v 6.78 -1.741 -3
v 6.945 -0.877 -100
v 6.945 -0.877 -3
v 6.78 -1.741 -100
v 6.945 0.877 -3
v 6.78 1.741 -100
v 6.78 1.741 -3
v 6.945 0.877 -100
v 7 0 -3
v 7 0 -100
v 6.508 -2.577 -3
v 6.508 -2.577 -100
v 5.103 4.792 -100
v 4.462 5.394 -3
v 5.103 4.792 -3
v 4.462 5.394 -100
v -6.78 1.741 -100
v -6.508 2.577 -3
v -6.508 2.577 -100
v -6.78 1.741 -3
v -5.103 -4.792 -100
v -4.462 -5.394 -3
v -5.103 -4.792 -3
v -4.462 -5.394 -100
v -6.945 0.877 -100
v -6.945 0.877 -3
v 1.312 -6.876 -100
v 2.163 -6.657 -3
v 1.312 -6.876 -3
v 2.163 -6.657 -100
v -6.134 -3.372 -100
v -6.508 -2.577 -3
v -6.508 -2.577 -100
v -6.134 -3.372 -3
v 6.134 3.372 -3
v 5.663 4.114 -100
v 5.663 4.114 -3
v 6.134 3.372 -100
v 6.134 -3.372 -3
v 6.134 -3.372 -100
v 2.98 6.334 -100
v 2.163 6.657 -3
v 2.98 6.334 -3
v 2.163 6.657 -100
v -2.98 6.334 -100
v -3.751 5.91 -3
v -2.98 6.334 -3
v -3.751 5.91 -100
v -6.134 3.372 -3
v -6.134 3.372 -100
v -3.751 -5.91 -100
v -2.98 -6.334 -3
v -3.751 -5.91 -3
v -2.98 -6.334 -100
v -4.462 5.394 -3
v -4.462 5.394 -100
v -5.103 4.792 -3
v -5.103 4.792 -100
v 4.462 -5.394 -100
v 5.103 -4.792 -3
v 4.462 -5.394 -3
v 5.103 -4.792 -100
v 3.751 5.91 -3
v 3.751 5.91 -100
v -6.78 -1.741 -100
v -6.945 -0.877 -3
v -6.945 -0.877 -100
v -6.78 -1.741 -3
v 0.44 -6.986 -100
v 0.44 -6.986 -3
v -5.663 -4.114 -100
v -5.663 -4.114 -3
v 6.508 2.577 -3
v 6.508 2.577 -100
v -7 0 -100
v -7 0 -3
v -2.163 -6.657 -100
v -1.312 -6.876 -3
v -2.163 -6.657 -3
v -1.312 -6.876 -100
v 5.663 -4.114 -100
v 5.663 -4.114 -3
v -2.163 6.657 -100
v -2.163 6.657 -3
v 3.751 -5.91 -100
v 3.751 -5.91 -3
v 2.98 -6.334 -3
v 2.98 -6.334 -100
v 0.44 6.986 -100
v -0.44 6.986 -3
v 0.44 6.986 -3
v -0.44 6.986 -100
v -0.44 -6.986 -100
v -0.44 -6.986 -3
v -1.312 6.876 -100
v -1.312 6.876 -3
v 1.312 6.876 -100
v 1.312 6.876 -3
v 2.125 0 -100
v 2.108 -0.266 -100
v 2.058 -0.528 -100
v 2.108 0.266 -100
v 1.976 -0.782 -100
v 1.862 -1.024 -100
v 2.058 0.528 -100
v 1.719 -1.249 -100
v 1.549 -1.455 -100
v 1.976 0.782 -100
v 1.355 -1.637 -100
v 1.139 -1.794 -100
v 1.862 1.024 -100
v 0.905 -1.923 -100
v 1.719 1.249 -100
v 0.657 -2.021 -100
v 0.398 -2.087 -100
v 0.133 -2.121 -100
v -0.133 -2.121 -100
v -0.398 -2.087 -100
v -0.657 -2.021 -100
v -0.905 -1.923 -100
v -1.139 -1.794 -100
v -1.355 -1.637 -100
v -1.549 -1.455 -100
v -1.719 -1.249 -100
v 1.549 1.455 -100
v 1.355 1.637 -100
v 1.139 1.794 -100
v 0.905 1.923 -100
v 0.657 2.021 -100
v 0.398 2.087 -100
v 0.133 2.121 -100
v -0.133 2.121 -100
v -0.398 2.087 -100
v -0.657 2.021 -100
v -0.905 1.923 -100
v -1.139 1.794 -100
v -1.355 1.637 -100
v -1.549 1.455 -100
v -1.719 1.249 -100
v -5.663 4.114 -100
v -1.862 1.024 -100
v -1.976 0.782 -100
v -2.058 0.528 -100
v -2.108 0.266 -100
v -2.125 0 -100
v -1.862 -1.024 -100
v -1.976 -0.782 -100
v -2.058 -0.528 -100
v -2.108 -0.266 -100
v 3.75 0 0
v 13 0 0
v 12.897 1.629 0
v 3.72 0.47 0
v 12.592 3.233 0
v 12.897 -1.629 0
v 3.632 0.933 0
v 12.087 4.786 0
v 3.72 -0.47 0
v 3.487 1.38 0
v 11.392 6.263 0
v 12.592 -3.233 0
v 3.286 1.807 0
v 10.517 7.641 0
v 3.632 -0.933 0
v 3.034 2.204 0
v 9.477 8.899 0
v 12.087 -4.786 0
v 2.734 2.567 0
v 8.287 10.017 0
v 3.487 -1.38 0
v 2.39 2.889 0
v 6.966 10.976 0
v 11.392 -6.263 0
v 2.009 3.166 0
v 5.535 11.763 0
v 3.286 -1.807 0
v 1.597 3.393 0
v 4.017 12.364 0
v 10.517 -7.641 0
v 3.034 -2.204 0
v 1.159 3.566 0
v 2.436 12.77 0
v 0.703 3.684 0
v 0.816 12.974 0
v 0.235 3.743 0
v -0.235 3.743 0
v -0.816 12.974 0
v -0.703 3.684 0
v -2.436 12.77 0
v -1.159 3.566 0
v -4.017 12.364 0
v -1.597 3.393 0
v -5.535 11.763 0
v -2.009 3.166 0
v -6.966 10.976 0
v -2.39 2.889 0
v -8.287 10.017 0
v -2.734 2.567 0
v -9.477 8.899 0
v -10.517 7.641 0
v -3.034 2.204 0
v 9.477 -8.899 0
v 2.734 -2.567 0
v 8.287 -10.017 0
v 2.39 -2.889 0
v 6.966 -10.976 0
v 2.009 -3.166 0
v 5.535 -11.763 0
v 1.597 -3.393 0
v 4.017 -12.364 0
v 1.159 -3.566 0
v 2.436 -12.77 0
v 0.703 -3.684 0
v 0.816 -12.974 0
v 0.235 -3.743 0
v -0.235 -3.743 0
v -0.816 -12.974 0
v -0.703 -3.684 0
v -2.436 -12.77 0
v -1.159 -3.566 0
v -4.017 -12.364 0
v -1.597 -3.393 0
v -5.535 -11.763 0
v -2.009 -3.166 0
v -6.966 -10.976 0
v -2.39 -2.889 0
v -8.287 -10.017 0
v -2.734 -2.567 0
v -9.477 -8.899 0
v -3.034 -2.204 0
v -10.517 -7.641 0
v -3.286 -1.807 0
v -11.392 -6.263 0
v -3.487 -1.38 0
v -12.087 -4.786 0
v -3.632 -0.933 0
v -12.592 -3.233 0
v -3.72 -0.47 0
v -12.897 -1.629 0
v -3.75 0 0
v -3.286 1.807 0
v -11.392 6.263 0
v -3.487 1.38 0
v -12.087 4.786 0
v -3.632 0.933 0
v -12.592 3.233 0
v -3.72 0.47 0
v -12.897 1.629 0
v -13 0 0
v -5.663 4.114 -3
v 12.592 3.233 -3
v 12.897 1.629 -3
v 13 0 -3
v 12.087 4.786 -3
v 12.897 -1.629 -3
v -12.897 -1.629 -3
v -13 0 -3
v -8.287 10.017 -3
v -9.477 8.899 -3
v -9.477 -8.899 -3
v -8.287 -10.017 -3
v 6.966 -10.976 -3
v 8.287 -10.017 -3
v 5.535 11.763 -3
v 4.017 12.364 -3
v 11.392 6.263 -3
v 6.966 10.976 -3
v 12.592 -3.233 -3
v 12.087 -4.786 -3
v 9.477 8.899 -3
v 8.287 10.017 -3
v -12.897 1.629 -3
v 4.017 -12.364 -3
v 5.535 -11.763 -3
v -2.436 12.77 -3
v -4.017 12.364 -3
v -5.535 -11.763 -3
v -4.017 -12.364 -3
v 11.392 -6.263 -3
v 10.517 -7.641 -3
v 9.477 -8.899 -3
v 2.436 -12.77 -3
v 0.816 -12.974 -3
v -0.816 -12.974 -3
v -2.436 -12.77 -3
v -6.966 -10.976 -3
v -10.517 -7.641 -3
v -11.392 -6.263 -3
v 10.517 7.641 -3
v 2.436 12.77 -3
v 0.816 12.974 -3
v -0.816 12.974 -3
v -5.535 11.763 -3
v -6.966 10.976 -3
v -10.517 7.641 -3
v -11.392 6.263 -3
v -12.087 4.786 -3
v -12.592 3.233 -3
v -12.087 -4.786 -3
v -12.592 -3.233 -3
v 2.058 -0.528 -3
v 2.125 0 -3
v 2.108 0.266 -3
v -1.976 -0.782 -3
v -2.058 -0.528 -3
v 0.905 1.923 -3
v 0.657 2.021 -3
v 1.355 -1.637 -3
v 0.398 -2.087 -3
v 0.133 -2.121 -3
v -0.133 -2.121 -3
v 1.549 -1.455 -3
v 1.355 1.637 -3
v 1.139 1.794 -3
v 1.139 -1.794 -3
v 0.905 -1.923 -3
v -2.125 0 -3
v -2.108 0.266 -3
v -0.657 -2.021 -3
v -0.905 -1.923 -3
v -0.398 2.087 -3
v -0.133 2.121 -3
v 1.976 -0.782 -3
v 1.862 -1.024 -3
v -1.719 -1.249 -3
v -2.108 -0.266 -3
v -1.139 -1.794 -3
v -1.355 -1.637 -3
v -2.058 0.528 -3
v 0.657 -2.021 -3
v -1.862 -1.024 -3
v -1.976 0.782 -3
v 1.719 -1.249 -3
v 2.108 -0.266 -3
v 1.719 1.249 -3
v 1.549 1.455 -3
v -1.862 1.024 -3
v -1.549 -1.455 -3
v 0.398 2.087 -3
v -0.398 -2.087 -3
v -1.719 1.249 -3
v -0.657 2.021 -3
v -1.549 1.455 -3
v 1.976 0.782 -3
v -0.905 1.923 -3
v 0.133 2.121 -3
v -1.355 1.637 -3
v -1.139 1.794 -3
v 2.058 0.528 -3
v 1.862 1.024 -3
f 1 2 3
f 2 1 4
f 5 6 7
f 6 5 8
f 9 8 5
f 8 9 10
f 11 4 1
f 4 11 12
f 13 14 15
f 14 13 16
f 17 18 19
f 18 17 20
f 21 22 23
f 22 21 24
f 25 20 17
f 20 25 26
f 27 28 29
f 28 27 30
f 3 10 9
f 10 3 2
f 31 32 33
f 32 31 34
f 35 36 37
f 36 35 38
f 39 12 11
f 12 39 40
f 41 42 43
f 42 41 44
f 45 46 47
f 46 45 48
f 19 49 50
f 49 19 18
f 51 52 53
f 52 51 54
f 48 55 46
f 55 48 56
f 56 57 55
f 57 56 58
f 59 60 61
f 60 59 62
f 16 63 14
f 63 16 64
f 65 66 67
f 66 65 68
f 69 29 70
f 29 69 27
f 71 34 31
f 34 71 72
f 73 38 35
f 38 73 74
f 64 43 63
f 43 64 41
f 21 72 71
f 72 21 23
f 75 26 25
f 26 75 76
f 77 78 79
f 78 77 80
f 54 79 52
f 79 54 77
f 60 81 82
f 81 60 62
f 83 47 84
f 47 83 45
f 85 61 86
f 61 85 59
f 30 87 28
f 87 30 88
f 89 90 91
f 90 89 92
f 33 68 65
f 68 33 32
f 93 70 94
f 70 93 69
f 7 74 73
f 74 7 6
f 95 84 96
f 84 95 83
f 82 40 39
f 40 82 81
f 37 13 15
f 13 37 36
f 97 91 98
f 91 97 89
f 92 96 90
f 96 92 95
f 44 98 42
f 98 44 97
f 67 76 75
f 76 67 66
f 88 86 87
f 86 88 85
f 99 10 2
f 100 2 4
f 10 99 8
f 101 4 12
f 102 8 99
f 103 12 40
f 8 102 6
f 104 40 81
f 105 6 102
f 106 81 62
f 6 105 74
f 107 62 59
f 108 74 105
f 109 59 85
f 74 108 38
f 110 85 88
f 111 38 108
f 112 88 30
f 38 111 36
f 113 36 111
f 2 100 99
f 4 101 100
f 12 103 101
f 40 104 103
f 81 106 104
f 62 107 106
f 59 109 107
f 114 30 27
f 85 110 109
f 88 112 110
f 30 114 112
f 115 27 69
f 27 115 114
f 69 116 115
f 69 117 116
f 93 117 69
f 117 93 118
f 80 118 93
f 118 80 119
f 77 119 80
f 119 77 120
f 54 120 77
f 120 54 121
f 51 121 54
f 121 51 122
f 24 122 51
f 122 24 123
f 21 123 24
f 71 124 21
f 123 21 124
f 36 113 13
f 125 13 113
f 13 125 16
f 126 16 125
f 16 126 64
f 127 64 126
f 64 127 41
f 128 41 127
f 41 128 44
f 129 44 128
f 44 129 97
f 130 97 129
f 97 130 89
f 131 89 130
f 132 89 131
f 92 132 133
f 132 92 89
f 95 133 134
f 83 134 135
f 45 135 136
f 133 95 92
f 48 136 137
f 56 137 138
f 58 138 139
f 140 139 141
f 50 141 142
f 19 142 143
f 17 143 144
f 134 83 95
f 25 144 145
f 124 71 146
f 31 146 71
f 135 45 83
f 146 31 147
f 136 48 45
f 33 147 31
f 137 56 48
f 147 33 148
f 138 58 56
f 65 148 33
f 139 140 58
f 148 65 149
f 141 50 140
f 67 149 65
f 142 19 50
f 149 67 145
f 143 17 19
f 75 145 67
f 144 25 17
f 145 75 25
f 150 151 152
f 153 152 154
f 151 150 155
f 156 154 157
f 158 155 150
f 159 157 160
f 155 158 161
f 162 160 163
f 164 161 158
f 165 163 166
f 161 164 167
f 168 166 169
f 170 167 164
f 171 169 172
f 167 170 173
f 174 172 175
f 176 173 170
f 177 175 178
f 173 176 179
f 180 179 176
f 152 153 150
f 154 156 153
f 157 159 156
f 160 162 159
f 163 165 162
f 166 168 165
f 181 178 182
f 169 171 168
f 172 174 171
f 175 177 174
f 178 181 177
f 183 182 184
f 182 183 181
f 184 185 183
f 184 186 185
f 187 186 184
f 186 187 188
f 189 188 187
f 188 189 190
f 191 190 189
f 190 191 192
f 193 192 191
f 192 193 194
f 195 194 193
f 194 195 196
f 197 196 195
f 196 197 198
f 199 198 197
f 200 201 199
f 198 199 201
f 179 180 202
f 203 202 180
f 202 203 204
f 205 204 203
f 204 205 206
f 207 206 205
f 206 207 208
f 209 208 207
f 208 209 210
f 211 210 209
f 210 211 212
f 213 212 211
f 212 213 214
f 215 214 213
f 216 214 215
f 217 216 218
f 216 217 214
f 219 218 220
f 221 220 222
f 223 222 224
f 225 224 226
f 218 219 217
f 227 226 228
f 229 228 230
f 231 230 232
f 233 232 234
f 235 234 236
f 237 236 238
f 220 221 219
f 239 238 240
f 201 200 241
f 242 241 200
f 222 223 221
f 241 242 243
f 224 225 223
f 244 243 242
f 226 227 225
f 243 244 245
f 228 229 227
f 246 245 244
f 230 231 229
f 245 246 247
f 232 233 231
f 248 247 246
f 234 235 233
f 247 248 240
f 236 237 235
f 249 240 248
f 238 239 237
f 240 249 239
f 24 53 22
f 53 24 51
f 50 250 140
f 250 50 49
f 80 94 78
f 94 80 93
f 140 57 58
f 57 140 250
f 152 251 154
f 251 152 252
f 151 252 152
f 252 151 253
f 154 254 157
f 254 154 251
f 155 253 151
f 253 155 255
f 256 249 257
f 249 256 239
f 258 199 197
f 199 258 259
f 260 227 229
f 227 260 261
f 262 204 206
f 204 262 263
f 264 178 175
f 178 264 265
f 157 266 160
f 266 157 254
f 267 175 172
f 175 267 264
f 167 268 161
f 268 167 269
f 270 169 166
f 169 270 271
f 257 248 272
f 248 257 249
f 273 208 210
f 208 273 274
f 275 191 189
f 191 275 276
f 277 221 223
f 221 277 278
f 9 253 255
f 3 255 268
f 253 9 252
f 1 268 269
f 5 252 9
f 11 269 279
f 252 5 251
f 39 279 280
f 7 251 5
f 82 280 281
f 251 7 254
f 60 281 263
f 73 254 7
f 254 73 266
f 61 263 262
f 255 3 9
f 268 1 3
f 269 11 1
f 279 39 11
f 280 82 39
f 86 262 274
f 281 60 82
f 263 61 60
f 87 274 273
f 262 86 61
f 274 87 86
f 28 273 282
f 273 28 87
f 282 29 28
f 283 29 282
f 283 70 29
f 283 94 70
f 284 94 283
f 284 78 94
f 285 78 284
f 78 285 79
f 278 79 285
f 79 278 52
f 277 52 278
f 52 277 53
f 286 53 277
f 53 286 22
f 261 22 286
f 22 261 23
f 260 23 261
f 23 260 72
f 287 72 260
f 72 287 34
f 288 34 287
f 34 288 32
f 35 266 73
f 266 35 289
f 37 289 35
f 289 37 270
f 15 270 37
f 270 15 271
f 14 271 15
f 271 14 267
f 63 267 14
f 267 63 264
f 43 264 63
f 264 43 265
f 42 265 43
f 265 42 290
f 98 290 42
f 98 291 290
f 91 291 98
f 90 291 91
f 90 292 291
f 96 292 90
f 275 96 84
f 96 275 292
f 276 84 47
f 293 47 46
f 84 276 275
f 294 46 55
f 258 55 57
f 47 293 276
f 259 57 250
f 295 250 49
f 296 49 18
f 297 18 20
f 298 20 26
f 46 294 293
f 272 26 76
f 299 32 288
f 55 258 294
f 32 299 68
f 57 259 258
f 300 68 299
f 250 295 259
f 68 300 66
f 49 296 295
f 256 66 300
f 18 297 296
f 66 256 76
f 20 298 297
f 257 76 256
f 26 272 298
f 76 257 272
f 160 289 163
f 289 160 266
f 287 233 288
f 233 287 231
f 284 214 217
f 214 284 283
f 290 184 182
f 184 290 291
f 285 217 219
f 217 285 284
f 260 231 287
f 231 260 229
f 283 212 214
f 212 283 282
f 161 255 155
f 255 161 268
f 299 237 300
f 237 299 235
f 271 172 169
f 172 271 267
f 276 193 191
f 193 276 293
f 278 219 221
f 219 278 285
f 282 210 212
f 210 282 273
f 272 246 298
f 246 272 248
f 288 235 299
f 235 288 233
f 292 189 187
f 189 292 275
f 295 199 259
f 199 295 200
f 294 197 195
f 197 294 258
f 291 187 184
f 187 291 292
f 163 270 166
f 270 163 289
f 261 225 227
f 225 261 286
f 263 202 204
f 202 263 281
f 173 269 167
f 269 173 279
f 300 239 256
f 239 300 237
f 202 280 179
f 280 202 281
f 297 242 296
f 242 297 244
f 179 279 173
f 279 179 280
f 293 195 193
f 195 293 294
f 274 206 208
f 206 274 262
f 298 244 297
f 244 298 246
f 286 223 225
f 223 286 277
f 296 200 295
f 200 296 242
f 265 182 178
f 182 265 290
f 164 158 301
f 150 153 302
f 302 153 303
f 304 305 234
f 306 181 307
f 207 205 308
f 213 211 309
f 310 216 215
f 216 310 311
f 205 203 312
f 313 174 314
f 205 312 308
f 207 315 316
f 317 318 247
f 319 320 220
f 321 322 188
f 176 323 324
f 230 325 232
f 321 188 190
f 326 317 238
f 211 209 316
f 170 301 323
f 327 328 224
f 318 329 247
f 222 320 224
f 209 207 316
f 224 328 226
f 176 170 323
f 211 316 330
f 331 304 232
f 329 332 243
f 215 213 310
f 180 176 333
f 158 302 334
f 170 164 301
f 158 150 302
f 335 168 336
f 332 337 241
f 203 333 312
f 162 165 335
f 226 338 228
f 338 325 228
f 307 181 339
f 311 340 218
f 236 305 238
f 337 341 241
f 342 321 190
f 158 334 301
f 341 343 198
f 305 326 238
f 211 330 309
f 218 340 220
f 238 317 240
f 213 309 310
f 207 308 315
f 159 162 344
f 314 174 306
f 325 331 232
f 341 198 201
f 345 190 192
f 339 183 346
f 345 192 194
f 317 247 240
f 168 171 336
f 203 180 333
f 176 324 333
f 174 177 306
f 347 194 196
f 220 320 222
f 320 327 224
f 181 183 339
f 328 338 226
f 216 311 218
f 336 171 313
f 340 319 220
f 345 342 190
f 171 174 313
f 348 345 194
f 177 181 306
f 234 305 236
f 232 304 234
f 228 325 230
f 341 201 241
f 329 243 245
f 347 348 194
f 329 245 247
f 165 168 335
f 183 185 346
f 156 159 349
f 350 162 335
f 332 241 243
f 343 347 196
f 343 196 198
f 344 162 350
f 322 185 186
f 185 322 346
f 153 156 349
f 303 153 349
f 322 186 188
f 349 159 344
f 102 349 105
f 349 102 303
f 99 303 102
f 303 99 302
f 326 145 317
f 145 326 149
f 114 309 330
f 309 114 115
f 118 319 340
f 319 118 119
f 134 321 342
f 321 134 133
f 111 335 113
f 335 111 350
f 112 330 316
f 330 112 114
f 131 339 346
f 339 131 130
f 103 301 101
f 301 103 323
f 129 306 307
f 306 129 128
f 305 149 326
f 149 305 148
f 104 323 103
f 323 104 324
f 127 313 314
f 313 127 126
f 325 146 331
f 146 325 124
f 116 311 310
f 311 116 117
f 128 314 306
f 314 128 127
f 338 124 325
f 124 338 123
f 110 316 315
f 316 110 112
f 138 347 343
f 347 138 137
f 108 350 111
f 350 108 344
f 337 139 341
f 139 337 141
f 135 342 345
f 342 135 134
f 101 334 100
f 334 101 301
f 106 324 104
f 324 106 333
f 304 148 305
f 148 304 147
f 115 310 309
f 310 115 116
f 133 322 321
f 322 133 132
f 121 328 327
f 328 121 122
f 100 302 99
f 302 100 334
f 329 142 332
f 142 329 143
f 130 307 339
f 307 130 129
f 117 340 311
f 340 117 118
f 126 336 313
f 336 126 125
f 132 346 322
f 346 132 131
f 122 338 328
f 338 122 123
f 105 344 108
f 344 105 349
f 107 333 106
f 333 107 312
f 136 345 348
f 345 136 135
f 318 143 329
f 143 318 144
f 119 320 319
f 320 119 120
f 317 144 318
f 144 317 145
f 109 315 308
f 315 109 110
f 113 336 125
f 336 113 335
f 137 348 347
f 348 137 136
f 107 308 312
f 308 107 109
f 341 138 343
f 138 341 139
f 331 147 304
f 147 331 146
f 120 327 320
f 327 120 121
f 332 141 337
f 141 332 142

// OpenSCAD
$fn = 50;


difference() {
	union() {
		translate(v = [0, 0, -100.0000000000]) {
			cylinder(h = 100, r = 7.0000000000);
		}
		translate(v = [0, 0, -3.0000000000]) {
			cylinder(h = 3, r = 13.0000000000);
		}
	}
	union() {
		translate(v = [0, 0, 0]) {
			rotate(a = [0, 0, 0]) {
				difference() {
					union() {
						#translate(v = [0, 0, -100.0000000000]) {
							cylinder(h = 100, r = 2.0000000000);
						}
						#translate(v = [0, 0, -3]) {
							cylinder(h = 3, r1 = 2.1250000000, r2 = 3.7500000000);
						}
						#translate(v = [0, 0, -100.0000000000]) {
							cylinder(h = 100, r = 2.1250000000);
						}
						#translate(v = [0, 0, -100.0000000000]) {
							cylinder(h = 100, r = 2.0000000000);
						}
					}
					union();
				}
			}
		}
	}
}
